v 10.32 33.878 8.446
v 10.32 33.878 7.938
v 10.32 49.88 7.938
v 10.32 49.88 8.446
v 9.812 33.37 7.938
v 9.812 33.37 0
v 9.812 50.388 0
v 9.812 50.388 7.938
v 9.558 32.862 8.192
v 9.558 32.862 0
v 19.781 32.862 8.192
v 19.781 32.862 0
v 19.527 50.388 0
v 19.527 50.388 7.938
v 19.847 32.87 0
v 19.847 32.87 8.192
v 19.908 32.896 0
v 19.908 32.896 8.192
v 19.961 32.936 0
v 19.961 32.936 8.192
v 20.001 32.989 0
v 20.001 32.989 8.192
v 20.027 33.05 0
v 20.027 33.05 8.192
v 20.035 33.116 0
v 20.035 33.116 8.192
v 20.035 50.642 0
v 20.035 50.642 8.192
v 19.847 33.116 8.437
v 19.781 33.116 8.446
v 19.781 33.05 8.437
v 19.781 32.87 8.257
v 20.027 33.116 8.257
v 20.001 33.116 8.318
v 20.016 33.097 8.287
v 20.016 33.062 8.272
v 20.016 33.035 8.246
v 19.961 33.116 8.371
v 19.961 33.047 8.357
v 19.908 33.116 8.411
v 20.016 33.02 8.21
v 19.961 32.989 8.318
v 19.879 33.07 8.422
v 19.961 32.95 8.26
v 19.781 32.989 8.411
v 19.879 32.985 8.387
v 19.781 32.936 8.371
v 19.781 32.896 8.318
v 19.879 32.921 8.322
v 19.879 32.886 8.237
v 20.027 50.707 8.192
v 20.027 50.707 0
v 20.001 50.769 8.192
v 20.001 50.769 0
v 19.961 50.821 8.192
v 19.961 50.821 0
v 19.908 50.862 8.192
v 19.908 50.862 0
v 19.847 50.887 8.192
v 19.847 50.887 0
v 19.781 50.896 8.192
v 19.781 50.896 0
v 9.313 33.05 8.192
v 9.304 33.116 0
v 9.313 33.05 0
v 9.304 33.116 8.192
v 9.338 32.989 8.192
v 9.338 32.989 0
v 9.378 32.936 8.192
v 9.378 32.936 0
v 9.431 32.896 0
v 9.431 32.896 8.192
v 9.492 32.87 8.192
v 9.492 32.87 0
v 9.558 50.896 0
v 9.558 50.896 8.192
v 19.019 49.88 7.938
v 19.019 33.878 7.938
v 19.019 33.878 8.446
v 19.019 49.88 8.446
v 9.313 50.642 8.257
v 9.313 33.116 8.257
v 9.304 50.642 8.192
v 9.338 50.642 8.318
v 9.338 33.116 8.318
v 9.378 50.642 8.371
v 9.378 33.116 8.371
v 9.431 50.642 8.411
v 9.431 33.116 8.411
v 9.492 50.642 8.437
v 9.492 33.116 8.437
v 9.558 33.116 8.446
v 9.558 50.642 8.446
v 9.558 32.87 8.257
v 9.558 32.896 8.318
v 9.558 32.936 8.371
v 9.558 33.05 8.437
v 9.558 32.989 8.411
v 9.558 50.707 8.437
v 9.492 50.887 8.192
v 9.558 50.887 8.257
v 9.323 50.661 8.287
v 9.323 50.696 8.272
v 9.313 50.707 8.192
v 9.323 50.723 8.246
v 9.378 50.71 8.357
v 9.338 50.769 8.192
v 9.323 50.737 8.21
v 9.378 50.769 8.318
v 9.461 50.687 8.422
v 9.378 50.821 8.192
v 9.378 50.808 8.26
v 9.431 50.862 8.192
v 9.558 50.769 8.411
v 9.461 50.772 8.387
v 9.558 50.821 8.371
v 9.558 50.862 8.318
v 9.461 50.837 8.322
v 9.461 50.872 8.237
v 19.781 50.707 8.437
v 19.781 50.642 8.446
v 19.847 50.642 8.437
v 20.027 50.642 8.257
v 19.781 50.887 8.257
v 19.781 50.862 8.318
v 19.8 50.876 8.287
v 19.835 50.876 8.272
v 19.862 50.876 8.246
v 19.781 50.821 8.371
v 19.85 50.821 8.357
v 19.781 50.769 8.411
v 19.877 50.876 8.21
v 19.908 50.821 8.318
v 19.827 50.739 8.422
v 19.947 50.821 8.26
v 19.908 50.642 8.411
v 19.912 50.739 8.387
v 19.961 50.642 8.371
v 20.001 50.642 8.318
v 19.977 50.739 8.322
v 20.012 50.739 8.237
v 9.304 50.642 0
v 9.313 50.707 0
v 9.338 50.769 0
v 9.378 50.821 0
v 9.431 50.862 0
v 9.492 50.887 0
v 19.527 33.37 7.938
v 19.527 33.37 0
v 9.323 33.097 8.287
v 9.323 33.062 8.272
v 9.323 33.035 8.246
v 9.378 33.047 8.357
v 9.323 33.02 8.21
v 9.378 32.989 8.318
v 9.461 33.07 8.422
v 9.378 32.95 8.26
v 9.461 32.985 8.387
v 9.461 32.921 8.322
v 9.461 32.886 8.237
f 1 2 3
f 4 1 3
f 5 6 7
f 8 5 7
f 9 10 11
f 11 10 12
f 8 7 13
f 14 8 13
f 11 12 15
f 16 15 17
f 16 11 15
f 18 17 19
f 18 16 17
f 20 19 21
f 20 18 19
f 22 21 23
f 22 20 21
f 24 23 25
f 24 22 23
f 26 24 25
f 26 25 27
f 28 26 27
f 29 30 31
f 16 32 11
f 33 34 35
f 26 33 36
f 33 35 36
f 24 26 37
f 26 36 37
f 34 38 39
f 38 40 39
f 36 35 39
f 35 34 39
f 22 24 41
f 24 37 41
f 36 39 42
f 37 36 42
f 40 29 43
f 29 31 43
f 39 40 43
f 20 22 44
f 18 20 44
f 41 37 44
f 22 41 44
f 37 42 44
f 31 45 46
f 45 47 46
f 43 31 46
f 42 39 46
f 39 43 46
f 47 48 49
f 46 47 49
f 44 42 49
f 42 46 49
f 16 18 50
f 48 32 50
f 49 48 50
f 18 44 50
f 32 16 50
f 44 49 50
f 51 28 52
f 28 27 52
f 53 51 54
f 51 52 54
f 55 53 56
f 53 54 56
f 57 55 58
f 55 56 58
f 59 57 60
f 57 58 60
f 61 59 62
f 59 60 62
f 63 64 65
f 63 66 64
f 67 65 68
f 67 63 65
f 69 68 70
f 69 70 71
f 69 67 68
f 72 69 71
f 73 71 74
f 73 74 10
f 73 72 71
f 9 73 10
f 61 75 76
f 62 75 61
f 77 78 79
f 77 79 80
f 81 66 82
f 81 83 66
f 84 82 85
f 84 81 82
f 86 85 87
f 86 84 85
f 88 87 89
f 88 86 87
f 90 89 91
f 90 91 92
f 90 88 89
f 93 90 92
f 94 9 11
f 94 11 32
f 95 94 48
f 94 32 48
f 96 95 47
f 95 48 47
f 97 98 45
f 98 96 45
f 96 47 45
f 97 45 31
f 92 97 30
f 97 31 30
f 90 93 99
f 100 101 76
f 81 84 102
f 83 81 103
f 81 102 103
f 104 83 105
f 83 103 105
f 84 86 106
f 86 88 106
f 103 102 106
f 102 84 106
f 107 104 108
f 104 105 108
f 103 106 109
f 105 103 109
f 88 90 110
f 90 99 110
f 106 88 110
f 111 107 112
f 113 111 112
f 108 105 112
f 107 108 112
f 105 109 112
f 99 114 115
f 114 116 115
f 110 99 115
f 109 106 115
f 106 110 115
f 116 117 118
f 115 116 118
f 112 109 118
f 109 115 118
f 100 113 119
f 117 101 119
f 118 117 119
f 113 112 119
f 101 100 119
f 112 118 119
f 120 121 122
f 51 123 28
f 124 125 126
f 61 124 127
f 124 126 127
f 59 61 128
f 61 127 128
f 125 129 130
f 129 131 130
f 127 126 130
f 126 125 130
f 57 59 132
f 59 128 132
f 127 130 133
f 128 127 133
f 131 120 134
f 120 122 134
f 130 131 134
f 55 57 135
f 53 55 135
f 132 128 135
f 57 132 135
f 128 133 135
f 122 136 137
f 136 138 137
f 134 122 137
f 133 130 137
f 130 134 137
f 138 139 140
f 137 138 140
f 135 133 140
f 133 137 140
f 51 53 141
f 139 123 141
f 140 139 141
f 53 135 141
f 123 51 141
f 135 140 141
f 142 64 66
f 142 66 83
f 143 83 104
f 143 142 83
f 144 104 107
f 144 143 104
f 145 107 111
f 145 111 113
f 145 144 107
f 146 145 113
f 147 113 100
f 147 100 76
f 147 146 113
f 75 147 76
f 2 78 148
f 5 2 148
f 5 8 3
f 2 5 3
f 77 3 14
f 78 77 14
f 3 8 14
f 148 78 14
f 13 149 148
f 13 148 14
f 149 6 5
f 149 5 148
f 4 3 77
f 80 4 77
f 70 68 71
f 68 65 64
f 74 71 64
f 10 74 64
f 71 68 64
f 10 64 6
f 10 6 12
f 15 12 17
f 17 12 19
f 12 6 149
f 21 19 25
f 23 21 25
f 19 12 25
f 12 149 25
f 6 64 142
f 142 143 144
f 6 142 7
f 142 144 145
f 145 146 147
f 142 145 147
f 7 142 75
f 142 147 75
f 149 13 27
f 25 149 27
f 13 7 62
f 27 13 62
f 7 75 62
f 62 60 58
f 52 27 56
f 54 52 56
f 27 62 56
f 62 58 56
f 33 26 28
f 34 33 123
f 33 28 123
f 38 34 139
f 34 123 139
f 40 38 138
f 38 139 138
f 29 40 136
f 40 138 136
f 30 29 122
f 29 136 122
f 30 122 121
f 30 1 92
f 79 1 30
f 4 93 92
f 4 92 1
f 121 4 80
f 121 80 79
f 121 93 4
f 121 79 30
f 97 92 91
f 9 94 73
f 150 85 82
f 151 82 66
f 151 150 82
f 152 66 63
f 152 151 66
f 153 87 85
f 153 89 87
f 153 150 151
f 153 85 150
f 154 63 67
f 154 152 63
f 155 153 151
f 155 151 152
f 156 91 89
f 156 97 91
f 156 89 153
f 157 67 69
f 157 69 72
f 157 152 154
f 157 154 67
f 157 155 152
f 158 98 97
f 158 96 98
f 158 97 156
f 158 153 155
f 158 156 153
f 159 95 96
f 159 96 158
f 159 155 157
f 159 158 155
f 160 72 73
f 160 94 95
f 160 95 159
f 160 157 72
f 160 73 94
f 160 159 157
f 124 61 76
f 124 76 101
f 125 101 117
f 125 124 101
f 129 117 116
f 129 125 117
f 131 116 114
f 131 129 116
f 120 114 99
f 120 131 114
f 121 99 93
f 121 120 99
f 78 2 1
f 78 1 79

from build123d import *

# Parameters (mm, degrees)
SKETCH1_W           = 10.7315
SKETCH1_H           = 18.034
BOSS_EXTRUDE1_DEPTH = 7.9375
SHELL1_T            = -0.508
SKETCH2_W           = 10.7315
SKETCH2_H           = 18.034
SKETCH2_W_2         = 8.6995
SKETCH2_H_2         = 16.002
EXTRUDE_THIN1_DEPTH = 0.508
FILLET2_R           = 0.254


with BuildPart() as part:
    # Sketch1 → Boss-Extrude1 (new body)
    with BuildSketch(Plane.XY):
        with Locations((14.669644351, 41.878696913)):
            Rectangle(SKETCH1_W, SKETCH1_H)
    extrude(amount=BOSS_EXTRUDE1_DEPTH)

    # Shell1
    shell1_openings = [part.faces().sort_by_distance(p)[0] for p in [
        (14.669644351, 41.878696913, 7.9375),
        (14.669644351, 41.878696913, 0),
    ]]
    offset(amount=SHELL1_T, openings=shell1_openings, kind=Kind.INTERSECTION)

    # Sketch2 → Extrude-Thin1 (add)
    with BuildSketch(Plane.XY.offset(7.9375)):
        with Locations((14.669644351, 41.878696913)):
            Rectangle(SKETCH2_W, SKETCH2_H)
        with Locations((14.669644351, 41.878696913)):
            Rectangle(SKETCH2_W_2, SKETCH2_H_2, mode=Mode.SUBTRACT)
    extrude(amount=EXTRUDE_THIN1_DEPTH)

    # Fillet2
    fillet2_edges = [part.edges().sort_by_distance(p)[0] for p in [
        (14.669644351, 32.861696913, 8.4455),
        (20.035394351, 41.878696913, 8.4455),
        (14.669644351, 50.895696913, 8.4455),
        (9.303894351, 41.878696913, 8.4455),
        (9.303894351, 50.895696913, 4.22275),
        (20.035394351, 50.895696913, 4.22275),
        (20.035394351, 32.861696913, 4.22275),
        (9.303894351, 32.861696913, 4.22275),
    ]]
    fillet(fillet2_edges, radius=FILLET2_R)


solid = part.part
